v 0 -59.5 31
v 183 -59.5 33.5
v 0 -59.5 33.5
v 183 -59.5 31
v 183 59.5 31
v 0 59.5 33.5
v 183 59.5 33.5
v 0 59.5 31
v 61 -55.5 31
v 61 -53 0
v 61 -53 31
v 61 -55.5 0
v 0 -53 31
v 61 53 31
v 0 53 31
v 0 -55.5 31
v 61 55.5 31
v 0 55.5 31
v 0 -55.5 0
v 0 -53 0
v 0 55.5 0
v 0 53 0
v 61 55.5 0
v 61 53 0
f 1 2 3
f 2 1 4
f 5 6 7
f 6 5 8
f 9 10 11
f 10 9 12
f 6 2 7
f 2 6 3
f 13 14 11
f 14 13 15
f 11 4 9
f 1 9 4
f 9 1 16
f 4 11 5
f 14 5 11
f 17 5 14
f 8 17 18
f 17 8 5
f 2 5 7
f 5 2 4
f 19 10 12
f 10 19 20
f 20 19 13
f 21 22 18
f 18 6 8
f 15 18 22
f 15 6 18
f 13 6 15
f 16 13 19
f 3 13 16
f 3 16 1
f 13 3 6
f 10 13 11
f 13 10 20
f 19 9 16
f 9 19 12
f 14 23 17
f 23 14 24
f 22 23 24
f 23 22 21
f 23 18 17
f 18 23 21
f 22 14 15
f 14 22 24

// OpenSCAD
/* [Preset Camper Box Dimensions] */

// Plyboard thickness
Wood_thickness = 2.5;

// Height from cabin floor
Camperbox_height = 31;

// From left wheel-arch to right wheel-arch
Camperbox_width = 119;

// Camperbox leg Instep (to clear wheel arches etc)
Camperbox_leg_instep = -4; 

// From boot to folded seat (first top section)
Boot_to_folded_seat = 61;

// From start of folded seat to end of folded seat inc head rest (second top section)
Folded_seat_to_seat_head = 61; 

// From top of folded headrest to seat back (third top section)
Seat_head_to_frontseat = 61; 


/* [Visibility settings] */

// Show component parts
Show_helpers = 0; // [0:"Box", 1:"Cut guide"]

// Show camperbox as folded/unfolded
State = "unfolded"; // [folded, unfolded]
Wood_thicknessop2_a = (State == "unfolded") ? 0 : 180; // angle of top2 (180 = folded, 0 = unfolded)
Wood_thicknessop3_a = (State == "unfolded") ? 0 : -180; // angle of top3 (-180 = folded 0 = unfolded)

/* [Stock wood sizes] */
Stock_wood_length = 244; // long-side length
Stock_wood_thickness = Wood_thickness; // thickness
Stock_wood_width = 122; // short-side width

//module __Customizer_Limit__ () {}
/* [Hidden] */

// Global rescaler (X*1)
rescaler = 1; 

// Min. facet render level 
$fs = 0.1;  // Don't generate smaller facets than 0.1

// Min angles render level (deg)
$fa = 5;    // Don't generate larger angles than 5 degrees

// Horiz. spacing between debug parts
debug_spacing_y = 15;

// Vert. spacing between debug parts
    
debug_spacing_z =0; 


/* [top1 dimensions] */

// Thickness of box
top1_x = Boot_to_folded_seat;
// Width of box
top1_y = Wood_thickness;
// Height of box
top1_z = Camperbox_width; 


/* [top2 dimensions] */

// Thickness of box
top2_x = Folded_seat_to_seat_head;
// Width of box 
top2_y = Wood_thickness;
// Height of box
top2_z = Camperbox_width; 


/* [top3 dimensions] */

// Thickness of box
top3_x = Seat_head_to_frontseat;
// Width of box
top3_y = Wood_thickness;
// Height of box
top3_z = Camperbox_width; 


/* [lside dimensions] */

// Thickness of box
lside_x = Boot_to_folded_seat;
// Width of box
lside_y = Wood_thickness;
// Height of box
lside_z = Camperbox_height; 


/* [rside dimensions] */

// Thickness of box
rside_x = Boot_to_folded_seat;
// Width of box
rside_y = Wood_thickness;
// Height of box
rside_z = Camperbox_height; 

// Main geometry
if (Show_helpers == 0) camperbox();


// Core geometric primitives

module lside(arg = "") {
    color("blue") cube([lside_x,lside_y,lside_z], center=true);
    if (arg == "show_dims") printdims(lside_x,lside_y,lside_z);
}

module rside(arg = "") {
    color("red") cube([rside_x,rside_y,rside_z], center=true);
    if (arg == "show_dims") printdims(rside_x,rside_y,rside_z);
}

module top1(arg = "") {
    color("yellow") cube([top1_x,top1_y,top1_z], center=true);
    if (arg == "show_dims") printdims(top1_x,top1_y,top1_z);
}

module top2(arg = "") {
        color("pink") cube([top2_x,top2_y,top2_z], center=true);
        if (arg == "show_dims") printdims(top2_x,top2_y,top2_z);
}

module top3(arg = "") {
    color("orange") cube([top3_x,top3_y,top3_z], center=true);
    if (arg == "show_dims") printdims(top3_x,top3_y,top3_z);
}


// Intermediate components

module top2_3() {
    rotate([0,0,Wood_thicknessop2_a]) 
        union() {
            translate([0+top2_x/2,0-Wood_thickness/2,0]) top2();
            translate([Folded_seat_to_seat_head,0-Wood_thickness,0]) rotate([0,0,Wood_thicknessop3_a]) translate([0+top3_x/2,Wood_thickness/2,0]) top3();
        }
}

module camperbox() {
    translate ([0+Boot_to_folded_seat/2,0-Camperbox_width/2-Camperbox_leg_instep+Wood_thickness/2,0+Camperbox_height/2]) rotate([0,0,0]) lside();
    translate ([0+Boot_to_folded_seat/2,Camperbox_width/2+Camperbox_leg_instep-Wood_thickness/2,0+Camperbox_height/2]) rotate([0,0,0]) rside();
    translate ([0+Boot_to_folded_seat/2,0,Camperbox_height/2 + top1_y/2 + Camperbox_height/2]) rotate([90,0,0]) top1();
    translate ([0+Boot_to_folded_seat,0,Camperbox_height/2 + top2_y/2 + Camperbox_height/2 + Wood_thickness/2]) rotate([90,0,0]) top2_3(); 
}

// debug display 
//***************

// Helpers
if (Show_helpers == 1) helpers();
    
module printdims (x, y, z) {
    rotate([90,0,0]) translate([0-x/2 + 1,0+z/2 - 1,Wood_thickness/2]) color("black") text(str("X: ", x, ", ", "Y: ", y, ", ", "Z: ", z, ", "), size = 4, valign = "top");
}

module helpers() {
    
    // primitives
/*
    translate([0 + lside_x/2, 0 + debug_spacing_y*2 - lside_y/2, debug_spacing_z  * -1]) lside("show_dims");
    translate([0 + rside_x/2, 0 + debug_spacing_y*4 - rside_y/2, debug_spacing_z * -1]) rside("show_dims");
    translate([0 + top1_x/2, 0 + debug_spacing_y*6 - top1_y/2, debug_spacing_z * -1]) top1("show_dims");
    translate([0 + top2_x/2, 0 + debug_spacing_y*8 - top2_y/2, debug_spacing_z * -1]) top2("show_dims");
    translate([0+ top3_x/2, 0 + debug_spacing_y*10 - top2_y/2, debug_spacing_z * -1]) top3("show_dims");
    
 */
    
    translate([0,0, debug_spacing_z * -3])  cube([Stock_wood_length,Stock_wood_thickness,Stock_wood_width]);  // the shop-brought wood for cutting
    translate([0 + top1_x/2, 0 - top1_y/2, (debug_spacing_z * -3) + top1_z/2]) top1("show_dims");
    translate([0 + top2_x/2 + top1_x, 0 - top2_y/2, (debug_spacing_z * -3) + top2_z/2]) top2("show_dims");
    translate([0 + top3_x/2 + top1_x + top2_x, 0 - top2_y/2, (debug_spacing_z * -3) + top3_z/2]) top3("show_dims");
    translate([0 + lside_z/2 + top1_x + top2_x + top3_x, 0 - lside_y/2, (debug_spacing_z  * -3) + lside_x/2]) rotate([0,90,0]) lside("show_dims");
    translate([0 + rside_z/2 + top1_x + top2_x + top3_x, 0 - rside_y/2, (debug_spacing_z  * -3) + rside_x/2 + rside_x]) rotate([0,90,0]) rside("show_dims");
    translate([0 + lside_z/2 + top1_x + top2_x + top3_x + lside_z, 0 - lside_y/2, (debug_spacing_z  * -3) + lside_x/2]) rotate([0,90,0]) lside("show_dims");
    translate([0 + rside_z/2 + top1_x + top2_x + top3_x + lside_z, 0 - rside_y/2, (debug_spacing_z  * -3) + rside_x/2 + rside_x]) rotate([0,90,0]) rside("show_dims");

}


echo(version=version());
// Written by Ed Watson <mail@edwardwatson.co.uk>
//
// To the extent possible under law, the author(s) have dedicated all
// copyright and related and neighboring rights to this software to the
// public domain worldwide. This software is distributed without any
// warranty.
//
// You should have received a copy of the CC0 Public Domain
// Dedication along with this software.
// If not, see <http://creativecommons.org/publicdomain/zero/1.0/>.

              
